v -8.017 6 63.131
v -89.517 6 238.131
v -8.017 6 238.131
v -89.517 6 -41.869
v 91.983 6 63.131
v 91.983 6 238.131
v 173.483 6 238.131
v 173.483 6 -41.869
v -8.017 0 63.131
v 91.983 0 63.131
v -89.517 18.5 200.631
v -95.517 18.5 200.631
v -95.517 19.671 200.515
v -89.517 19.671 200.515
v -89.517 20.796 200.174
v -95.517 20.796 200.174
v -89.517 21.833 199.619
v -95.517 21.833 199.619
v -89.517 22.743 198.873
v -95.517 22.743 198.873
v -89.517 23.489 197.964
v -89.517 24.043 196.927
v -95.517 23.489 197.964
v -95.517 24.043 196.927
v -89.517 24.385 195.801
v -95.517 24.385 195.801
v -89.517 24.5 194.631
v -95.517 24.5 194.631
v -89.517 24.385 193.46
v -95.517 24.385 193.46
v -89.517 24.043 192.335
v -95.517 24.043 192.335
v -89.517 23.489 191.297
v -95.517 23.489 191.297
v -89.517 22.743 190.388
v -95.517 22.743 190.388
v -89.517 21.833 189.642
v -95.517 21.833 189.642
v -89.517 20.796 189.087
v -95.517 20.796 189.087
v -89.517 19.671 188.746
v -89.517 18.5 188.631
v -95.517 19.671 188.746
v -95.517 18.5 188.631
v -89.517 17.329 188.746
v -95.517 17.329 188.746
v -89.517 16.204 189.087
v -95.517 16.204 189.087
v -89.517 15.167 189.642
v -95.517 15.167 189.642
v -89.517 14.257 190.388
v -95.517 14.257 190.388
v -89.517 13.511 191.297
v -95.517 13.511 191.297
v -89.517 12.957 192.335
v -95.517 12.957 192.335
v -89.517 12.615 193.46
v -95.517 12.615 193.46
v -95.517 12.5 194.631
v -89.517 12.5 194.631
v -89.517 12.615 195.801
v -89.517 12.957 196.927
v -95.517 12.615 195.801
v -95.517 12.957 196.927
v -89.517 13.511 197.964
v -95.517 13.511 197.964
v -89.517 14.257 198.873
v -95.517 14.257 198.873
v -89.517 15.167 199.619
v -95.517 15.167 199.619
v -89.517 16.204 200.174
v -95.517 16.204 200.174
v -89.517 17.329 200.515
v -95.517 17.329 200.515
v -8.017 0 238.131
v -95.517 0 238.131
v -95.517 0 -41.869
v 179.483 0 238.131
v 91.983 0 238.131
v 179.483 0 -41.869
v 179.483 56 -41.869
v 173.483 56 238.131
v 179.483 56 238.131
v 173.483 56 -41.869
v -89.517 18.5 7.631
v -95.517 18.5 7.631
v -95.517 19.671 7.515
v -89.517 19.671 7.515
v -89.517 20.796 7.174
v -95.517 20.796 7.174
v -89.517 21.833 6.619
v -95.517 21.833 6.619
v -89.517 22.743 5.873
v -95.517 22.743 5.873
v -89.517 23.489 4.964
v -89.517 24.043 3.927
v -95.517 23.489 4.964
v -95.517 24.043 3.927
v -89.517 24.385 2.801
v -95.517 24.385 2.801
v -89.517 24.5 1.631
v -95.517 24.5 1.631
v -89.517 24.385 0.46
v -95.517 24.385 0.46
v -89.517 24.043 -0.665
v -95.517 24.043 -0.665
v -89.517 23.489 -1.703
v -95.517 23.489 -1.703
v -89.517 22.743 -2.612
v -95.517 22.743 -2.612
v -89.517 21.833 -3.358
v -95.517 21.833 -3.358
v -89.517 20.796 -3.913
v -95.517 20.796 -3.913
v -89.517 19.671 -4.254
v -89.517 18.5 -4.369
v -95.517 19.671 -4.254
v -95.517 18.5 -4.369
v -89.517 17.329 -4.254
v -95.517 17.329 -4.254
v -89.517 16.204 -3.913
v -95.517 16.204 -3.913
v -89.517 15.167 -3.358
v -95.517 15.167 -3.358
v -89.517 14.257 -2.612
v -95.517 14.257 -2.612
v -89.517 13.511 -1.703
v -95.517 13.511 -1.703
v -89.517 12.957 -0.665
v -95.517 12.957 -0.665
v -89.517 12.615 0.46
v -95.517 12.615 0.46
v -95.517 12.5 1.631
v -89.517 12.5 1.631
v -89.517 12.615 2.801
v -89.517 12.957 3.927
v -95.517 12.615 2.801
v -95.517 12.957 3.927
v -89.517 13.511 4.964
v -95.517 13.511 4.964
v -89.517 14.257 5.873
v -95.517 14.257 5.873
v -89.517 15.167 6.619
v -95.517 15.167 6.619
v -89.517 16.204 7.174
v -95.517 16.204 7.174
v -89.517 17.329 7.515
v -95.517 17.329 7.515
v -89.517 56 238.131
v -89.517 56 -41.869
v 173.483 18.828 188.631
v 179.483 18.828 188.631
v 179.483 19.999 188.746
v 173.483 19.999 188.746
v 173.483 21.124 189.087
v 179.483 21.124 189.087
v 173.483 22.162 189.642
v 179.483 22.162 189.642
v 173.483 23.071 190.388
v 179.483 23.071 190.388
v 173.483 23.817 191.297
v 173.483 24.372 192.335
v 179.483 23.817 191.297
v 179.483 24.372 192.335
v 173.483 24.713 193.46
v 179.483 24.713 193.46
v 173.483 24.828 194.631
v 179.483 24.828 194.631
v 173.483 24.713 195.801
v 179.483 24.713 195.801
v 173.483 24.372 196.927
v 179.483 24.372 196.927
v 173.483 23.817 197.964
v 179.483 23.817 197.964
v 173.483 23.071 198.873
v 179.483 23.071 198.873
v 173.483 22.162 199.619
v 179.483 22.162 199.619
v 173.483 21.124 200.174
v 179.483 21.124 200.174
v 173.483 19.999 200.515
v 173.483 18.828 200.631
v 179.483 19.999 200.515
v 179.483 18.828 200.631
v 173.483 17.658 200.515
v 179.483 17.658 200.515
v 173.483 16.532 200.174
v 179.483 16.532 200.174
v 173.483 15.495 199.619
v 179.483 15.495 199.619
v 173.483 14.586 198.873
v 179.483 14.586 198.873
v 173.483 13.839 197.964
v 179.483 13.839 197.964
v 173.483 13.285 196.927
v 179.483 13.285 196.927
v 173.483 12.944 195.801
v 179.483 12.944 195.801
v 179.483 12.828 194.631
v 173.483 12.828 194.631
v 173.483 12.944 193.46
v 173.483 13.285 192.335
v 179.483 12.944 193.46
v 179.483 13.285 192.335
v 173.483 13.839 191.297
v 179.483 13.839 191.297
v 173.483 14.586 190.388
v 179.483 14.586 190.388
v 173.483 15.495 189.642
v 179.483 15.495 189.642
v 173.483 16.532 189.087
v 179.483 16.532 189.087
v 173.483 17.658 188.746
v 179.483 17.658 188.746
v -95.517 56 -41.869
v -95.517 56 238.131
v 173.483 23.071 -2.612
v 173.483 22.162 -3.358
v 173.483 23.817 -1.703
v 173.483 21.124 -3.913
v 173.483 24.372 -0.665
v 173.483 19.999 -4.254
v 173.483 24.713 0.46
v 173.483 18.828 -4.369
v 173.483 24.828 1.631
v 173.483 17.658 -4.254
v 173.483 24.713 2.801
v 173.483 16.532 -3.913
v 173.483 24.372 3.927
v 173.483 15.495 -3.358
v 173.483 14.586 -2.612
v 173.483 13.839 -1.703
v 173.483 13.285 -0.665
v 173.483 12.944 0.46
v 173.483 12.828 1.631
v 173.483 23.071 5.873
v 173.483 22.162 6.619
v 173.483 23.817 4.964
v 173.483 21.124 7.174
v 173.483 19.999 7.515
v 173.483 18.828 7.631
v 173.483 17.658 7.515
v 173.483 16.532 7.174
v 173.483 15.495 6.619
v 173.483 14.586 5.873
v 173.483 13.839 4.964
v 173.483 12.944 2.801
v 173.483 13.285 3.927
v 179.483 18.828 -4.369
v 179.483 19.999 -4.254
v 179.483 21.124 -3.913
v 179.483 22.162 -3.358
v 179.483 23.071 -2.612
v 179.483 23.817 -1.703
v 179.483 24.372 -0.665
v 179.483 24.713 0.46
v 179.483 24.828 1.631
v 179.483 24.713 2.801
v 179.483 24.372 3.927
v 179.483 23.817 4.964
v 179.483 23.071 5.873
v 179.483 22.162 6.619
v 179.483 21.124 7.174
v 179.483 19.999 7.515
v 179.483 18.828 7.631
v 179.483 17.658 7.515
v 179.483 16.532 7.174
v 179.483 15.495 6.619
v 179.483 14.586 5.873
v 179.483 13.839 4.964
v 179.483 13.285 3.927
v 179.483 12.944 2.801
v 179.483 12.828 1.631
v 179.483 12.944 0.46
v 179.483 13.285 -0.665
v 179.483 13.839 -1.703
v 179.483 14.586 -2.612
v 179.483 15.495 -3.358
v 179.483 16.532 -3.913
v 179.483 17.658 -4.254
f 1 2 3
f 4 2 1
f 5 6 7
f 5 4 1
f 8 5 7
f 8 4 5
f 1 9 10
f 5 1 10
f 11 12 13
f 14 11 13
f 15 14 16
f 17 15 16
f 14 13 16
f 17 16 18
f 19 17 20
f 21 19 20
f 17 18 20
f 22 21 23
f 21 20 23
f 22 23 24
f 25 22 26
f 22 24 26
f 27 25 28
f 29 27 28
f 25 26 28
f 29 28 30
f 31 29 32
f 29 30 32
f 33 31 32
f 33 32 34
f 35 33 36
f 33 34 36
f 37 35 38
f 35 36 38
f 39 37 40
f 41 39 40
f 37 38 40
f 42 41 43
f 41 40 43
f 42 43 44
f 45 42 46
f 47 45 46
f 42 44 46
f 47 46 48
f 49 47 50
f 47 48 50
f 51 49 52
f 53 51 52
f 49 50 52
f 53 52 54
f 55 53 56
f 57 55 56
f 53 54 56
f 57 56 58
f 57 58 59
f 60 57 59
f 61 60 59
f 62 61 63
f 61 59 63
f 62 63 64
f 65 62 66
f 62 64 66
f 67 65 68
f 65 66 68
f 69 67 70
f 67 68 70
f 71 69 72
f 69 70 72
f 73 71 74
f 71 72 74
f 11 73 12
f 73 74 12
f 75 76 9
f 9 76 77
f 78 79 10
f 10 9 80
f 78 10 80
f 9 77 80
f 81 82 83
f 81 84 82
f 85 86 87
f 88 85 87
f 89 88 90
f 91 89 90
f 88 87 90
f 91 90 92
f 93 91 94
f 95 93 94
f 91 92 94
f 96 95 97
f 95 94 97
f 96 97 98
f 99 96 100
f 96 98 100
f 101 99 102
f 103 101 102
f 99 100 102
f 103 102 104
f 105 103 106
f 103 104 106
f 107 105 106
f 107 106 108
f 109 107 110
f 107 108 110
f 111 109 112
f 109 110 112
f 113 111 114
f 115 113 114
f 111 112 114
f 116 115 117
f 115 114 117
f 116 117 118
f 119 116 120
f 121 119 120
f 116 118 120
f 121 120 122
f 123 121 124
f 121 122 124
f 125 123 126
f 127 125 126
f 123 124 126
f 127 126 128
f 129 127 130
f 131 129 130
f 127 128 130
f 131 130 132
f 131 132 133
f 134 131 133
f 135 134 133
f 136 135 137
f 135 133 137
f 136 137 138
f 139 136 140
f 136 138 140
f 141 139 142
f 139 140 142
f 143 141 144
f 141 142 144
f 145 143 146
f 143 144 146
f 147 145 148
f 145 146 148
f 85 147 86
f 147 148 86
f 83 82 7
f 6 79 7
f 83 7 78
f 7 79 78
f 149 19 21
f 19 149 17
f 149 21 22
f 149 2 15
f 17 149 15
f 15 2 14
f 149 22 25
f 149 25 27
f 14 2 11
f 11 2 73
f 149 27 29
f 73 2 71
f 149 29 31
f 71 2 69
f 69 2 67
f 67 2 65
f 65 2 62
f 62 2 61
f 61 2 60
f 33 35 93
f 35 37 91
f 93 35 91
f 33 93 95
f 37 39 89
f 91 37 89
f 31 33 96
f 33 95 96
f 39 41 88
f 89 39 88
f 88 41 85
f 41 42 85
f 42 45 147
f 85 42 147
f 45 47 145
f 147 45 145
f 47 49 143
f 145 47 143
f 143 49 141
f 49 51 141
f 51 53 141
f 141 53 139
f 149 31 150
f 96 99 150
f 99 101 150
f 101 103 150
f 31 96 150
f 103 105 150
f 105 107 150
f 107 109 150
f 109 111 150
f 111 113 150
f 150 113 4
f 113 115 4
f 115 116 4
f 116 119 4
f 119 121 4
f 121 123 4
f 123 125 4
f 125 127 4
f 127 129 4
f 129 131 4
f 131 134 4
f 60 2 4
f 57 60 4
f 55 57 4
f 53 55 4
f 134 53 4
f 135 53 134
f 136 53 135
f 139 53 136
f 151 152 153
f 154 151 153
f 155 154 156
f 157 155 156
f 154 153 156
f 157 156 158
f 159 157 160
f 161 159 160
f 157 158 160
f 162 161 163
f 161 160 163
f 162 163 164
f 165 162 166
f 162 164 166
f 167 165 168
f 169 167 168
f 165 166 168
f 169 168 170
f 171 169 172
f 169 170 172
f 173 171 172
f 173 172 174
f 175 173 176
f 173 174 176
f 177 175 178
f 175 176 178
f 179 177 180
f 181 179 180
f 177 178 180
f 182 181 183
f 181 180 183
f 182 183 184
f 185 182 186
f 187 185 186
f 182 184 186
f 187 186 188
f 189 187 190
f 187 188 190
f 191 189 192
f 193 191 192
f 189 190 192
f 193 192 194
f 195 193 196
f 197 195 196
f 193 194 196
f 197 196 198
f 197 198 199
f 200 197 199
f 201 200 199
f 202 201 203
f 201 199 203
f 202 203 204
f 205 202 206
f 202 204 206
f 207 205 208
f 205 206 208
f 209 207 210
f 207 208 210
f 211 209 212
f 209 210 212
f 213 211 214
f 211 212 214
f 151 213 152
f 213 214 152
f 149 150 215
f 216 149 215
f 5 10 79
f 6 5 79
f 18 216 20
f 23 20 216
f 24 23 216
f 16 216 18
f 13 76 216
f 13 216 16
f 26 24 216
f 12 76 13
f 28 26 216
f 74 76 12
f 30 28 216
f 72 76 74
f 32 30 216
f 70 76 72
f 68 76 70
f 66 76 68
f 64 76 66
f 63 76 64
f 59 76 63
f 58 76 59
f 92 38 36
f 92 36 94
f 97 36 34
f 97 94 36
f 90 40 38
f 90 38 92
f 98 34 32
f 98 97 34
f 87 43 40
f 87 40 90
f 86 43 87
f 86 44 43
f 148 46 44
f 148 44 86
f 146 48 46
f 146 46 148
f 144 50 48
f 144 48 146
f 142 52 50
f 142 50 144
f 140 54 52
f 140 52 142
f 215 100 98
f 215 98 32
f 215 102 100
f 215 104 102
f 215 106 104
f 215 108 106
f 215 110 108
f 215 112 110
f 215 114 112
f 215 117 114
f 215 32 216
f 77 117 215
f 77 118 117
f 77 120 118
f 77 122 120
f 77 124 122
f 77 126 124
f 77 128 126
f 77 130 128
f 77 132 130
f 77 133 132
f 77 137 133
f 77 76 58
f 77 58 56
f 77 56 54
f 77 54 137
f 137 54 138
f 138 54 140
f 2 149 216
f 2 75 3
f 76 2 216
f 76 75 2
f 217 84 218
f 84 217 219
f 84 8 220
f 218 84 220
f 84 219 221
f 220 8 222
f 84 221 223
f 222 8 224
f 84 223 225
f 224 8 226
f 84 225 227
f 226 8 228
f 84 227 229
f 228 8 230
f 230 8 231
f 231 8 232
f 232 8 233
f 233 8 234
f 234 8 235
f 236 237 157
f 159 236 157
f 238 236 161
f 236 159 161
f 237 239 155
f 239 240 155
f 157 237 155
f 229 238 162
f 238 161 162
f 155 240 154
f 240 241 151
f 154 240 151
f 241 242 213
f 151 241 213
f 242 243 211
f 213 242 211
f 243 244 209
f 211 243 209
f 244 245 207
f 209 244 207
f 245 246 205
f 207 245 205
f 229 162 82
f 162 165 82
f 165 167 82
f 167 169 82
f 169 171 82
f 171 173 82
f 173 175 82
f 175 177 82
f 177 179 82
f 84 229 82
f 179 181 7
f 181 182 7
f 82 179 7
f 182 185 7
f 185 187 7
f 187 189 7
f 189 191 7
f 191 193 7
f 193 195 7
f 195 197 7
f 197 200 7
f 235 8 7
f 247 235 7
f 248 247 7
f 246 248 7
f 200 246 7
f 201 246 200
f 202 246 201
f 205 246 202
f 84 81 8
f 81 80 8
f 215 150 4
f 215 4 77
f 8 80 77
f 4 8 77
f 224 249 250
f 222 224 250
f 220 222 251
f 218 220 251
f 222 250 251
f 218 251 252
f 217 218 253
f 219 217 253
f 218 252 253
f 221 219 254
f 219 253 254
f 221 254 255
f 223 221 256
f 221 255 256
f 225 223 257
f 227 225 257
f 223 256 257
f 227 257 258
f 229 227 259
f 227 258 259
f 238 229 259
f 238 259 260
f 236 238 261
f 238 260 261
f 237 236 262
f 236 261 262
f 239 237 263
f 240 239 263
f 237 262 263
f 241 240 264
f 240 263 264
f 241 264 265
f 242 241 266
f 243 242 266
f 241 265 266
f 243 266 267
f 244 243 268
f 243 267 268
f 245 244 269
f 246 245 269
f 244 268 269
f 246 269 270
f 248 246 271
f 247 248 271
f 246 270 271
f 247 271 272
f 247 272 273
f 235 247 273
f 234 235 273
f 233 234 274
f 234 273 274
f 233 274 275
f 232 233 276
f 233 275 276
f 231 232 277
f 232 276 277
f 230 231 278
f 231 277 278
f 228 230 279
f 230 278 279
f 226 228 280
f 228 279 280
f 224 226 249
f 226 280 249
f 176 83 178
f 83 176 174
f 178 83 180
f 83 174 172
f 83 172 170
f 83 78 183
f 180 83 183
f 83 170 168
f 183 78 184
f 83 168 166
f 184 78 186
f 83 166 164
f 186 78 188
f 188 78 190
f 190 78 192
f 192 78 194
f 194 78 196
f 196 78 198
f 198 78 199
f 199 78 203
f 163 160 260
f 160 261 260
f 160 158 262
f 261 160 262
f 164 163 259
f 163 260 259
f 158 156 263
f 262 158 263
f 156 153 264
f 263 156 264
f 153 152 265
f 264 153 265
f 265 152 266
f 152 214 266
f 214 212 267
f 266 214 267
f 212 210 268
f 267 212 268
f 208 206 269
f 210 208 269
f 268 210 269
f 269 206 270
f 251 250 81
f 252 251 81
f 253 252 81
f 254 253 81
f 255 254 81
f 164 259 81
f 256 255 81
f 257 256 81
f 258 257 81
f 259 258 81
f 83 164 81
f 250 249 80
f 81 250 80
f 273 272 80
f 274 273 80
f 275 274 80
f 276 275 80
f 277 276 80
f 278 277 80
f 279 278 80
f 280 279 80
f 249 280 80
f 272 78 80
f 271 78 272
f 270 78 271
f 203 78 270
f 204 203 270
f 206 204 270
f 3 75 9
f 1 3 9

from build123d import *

# Parameters (mm, degrees)
BOSS_EXTRUDE3_DEPTH = 6
BOSS_EXTRUDE5_DEPTH = 50
BOSS_EXTRUDE6_DEPTH = 50
SKETCH4_R           = 6
CUT_EXTRUDE1_DEPTH  = 6
SKETCH5_R           = 6
CUT_EXTRUDE2_DEPTH  = 6


with BuildPart() as part:
    # Sketch1 → Boss-Extrude3 (new body)
    with BuildSketch(Plane(origin=(0, 0, 0), x_dir=(1, 0, 0), z_dir=(0, 1, 0))):
        Polygon((-8.017197152, -238.130630631), (-8.017197152, -204.926643474), (-8.017197152, -63.130630631), (91.982802848, -63.130630631), (91.982802848, -238.130630631), (179.482802848, -238.130630631), (179.482802848, 41.869369369), (-95.517197152, 41.869369369), (-95.517197152, -238.130630631), align=None)
    extrude(amount=BOSS_EXTRUDE3_DEPTH)

    # Sketch2 → Boss-Extrude5 (add)
    with BuildSketch(Plane(origin=(0, 6, 0), x_dir=(1, 0, 0), z_dir=(0, 1, 0))):
        Polygon((-89.517197152, -17.106233318), (-89.517197152, -238.130630631), (-95.517197152, -238.130630631), (-95.517197152, 41.869369369), (-89.517197152, 41.869369369), align=None)
    extrude(amount=BOSS_EXTRUDE5_DEPTH)

    # Sketch3 → Boss-Extrude6 (add)
    with BuildSketch(Plane(origin=(0, 6, 0), x_dir=(1, 0, 0), z_dir=(0, 1, 0))):
        Polygon((173.482802848, -39.36353764), (173.482802848, -238.130630631), (179.482802848, -238.130630631), (179.482802848, 41.869369369), (173.482802848, 41.869369369), align=None)
    extrude(amount=BOSS_EXTRUDE6_DEPTH)

    # Sketch4 → Cut-Extrude1 (cut)
    with BuildSketch(Plane(origin=(179.482802848, 0, 0), x_dir=(0, 0, -1), z_dir=(1, 0, 0))):
        with Locations((-194.630630631, 18.828241407)):
            Circle(SKETCH4_R)
        with Locations((-1.630630631, 18.828241407)):
            Circle(SKETCH4_R)
    extrude(amount=-CUT_EXTRUDE1_DEPTH, mode=Mode.SUBTRACT)

    # Sketch5 → Cut-Extrude2 (cut)
    with BuildSketch(Plane.ZY.offset(95.517197152)):
        with Locations((1.630630631, 18.5)):
            Circle(SKETCH5_R)
        with Locations((194.630630631, 18.5)):
            Circle(SKETCH5_R)
    extrude(amount=-CUT_EXTRUDE2_DEPTH, mode=Mode.SUBTRACT)


solid = part.part
